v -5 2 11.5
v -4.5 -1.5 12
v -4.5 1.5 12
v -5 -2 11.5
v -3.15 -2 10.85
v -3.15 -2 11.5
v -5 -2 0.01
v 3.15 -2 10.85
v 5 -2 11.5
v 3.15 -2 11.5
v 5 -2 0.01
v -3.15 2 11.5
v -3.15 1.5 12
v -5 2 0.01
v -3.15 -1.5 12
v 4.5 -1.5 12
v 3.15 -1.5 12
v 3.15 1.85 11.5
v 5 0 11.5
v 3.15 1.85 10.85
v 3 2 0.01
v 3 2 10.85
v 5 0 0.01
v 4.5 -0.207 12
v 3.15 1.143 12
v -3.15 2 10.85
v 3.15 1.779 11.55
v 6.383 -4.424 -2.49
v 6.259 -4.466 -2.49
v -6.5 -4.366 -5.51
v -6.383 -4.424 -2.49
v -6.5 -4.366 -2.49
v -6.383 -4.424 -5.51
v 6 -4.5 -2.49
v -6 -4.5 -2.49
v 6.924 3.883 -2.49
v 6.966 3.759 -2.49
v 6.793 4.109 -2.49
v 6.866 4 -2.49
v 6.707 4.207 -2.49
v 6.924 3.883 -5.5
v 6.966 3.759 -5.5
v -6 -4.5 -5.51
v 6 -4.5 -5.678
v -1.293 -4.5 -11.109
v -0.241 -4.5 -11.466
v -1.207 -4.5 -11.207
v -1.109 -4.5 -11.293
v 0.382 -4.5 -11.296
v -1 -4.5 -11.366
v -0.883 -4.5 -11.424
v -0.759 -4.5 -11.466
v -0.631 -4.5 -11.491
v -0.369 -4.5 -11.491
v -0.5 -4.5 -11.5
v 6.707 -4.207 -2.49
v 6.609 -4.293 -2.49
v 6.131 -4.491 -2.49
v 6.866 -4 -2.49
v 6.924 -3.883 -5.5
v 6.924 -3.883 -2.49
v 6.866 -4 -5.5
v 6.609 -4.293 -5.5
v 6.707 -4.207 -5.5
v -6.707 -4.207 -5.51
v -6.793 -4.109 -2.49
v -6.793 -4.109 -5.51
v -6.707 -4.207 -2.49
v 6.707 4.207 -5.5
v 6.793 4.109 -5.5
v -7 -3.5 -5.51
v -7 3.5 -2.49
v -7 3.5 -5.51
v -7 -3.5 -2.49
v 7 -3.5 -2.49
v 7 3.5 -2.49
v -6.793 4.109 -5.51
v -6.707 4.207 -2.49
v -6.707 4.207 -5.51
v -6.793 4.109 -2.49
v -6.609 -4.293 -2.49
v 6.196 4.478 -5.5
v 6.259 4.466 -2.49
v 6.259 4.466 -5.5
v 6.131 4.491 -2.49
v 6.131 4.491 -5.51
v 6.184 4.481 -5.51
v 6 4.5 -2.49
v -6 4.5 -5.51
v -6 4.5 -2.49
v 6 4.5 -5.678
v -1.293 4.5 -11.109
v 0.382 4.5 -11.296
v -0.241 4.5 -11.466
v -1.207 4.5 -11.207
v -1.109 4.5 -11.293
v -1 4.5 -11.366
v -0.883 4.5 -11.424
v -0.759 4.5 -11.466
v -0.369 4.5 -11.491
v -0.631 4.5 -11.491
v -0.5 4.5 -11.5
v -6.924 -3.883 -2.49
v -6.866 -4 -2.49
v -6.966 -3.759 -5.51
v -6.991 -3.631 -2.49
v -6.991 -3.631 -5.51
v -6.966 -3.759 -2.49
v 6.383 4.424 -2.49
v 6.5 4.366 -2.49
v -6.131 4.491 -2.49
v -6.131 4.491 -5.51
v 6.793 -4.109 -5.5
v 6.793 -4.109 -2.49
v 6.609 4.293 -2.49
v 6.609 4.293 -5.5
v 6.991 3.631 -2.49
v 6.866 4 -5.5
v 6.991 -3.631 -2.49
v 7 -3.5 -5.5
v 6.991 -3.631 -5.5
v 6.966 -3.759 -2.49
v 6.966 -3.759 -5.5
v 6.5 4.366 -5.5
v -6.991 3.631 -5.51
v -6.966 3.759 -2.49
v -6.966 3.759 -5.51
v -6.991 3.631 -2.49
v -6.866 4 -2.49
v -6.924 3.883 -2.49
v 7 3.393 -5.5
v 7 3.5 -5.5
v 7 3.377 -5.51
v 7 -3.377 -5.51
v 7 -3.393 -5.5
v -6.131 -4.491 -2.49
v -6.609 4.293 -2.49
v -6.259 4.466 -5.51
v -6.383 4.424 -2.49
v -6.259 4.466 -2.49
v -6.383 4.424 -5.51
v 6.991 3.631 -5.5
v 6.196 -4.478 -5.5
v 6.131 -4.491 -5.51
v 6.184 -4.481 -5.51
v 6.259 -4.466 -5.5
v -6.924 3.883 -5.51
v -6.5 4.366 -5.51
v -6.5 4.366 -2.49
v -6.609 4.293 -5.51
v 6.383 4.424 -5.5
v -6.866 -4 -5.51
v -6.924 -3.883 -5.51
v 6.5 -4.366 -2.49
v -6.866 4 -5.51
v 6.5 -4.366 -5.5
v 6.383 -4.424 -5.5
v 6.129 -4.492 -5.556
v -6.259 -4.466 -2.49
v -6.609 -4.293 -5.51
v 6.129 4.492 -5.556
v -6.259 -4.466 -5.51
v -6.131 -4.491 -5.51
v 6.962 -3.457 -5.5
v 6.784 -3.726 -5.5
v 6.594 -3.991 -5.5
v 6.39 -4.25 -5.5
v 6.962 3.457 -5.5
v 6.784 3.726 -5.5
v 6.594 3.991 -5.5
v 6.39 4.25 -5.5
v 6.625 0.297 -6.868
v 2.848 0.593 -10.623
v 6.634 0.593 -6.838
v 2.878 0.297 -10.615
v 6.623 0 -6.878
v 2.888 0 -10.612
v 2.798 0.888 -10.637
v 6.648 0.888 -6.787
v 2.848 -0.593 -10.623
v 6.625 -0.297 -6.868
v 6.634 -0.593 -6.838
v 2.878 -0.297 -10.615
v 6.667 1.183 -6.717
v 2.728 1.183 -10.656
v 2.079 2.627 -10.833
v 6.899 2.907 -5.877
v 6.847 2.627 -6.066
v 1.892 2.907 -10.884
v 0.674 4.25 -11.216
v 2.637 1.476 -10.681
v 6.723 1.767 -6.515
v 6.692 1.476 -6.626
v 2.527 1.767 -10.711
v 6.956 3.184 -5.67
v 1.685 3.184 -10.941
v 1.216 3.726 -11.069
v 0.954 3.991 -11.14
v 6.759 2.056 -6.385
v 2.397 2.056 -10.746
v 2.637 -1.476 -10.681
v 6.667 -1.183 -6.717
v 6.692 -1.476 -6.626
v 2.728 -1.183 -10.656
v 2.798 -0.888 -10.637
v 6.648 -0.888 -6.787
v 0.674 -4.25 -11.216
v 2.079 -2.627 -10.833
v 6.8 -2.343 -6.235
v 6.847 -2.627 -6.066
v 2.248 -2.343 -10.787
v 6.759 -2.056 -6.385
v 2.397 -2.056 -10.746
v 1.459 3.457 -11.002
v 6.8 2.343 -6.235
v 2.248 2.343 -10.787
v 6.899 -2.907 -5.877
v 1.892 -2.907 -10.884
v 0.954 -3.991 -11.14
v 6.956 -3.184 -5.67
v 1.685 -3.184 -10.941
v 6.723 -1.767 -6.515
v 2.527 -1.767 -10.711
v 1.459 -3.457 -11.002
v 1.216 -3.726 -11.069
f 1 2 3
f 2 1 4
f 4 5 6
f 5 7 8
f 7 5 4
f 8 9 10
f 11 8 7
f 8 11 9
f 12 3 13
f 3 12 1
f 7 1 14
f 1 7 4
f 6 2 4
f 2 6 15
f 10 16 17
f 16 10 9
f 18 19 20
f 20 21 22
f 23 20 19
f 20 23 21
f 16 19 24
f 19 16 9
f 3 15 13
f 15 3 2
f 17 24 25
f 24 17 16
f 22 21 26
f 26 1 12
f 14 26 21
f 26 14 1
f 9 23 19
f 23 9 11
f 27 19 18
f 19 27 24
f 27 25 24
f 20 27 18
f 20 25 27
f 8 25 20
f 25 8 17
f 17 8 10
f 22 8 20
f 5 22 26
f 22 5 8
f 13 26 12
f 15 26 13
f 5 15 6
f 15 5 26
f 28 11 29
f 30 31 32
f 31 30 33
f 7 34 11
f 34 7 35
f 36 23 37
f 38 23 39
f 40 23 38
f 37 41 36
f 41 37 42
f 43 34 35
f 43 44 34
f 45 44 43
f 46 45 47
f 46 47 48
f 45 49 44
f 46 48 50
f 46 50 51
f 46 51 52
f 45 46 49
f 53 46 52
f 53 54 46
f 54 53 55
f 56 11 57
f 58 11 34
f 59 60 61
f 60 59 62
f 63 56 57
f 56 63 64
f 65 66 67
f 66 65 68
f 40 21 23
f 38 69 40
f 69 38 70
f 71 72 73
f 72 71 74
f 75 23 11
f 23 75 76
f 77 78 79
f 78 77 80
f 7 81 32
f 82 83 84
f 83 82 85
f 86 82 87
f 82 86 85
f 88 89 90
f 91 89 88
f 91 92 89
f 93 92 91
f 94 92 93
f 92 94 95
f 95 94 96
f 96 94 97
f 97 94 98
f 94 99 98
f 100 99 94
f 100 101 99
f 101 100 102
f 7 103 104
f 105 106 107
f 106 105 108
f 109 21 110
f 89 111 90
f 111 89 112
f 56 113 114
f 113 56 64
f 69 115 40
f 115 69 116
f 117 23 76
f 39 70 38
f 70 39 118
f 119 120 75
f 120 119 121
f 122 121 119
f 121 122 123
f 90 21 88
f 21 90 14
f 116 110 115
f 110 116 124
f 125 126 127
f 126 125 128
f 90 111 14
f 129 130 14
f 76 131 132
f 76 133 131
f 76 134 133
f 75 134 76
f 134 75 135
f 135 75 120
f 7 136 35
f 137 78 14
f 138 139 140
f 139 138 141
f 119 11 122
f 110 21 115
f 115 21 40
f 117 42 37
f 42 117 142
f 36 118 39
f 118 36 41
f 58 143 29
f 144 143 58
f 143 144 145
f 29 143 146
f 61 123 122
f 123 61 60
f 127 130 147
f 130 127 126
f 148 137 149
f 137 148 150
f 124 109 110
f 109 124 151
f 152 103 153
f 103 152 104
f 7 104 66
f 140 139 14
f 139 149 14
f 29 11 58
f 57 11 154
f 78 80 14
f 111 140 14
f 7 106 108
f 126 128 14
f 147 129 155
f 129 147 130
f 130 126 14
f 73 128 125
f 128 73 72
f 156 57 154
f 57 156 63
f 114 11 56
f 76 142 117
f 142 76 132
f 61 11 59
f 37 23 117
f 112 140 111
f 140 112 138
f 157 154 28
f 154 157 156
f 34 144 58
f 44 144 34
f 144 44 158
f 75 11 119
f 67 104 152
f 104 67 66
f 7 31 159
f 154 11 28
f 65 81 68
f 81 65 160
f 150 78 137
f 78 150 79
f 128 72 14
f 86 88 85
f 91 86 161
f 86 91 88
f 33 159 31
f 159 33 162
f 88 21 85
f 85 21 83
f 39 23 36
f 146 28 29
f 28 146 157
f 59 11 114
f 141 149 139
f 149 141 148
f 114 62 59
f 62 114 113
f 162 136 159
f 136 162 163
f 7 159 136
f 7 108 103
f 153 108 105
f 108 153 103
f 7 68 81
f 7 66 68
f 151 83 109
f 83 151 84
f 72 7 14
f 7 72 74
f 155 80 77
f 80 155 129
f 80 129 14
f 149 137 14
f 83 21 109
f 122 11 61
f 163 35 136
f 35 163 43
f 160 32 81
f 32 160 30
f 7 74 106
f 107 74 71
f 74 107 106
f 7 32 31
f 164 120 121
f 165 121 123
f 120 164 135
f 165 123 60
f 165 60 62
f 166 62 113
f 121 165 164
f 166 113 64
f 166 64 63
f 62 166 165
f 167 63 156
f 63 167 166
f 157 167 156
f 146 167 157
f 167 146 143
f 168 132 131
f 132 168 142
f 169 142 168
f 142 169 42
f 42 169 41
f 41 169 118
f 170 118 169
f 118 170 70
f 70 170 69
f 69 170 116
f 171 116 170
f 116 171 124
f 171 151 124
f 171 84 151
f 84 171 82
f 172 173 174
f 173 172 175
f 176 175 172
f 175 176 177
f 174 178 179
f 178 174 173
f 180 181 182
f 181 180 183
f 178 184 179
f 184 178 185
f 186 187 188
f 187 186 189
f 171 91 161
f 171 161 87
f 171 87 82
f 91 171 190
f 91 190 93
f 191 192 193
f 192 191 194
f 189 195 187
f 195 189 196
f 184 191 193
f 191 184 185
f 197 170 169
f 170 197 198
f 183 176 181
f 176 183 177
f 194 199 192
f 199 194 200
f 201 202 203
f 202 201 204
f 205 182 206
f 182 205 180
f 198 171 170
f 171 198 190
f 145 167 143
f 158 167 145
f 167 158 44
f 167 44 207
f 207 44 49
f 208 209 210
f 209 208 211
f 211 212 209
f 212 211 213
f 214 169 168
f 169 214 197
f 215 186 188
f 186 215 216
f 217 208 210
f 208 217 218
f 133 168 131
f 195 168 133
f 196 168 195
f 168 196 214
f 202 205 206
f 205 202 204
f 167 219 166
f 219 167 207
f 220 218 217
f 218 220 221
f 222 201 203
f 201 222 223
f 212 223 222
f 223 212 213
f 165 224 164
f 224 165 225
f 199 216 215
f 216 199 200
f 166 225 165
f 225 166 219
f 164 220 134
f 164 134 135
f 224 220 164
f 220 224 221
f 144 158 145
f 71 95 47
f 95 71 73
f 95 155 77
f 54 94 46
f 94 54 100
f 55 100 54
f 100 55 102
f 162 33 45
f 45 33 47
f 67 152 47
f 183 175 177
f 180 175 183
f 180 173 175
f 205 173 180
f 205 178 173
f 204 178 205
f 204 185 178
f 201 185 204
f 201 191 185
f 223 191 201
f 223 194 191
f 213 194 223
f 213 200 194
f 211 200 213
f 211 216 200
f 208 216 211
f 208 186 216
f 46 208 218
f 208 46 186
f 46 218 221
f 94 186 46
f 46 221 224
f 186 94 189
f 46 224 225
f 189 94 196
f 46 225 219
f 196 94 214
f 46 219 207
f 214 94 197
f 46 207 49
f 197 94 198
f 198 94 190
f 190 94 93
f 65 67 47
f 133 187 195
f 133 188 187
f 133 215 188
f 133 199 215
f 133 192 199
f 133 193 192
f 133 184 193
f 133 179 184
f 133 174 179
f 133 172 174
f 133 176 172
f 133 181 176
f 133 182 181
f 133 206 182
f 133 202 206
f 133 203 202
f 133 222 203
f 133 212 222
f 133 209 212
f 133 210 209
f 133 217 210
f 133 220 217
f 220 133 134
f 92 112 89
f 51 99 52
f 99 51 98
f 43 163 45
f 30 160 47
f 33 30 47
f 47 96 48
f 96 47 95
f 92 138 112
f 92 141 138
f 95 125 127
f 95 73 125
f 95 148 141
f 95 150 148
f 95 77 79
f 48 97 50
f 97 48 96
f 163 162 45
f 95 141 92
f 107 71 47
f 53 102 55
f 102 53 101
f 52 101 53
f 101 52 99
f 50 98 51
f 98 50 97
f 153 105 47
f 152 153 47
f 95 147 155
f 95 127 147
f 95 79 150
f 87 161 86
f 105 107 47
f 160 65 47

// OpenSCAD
// =====================================================================
//  tip_P_carrier.scad — SP1 tip P: carrier for a trimmed PRESS-ON NAIL
//  PROJECT SCRATCH · 05-engineering/cad/tips · units: mm
//  Zero-fabrication reference tip.  A press-on ABS nail (KISS 100 Full-Cover,
//  size 1-2, ~8-9 mm wide), trimmed to 10 mm long, is CA-bonded
//  with its concave underside on a CONVEX cylindrical bed (R 8.5, axis at 45 deg)
//  so its convex dorsal face faces +X and down = the leading face.
//  Bed length ≈ 7.5 mm; the nail's free edge overhangs ≈ 2.5-3 mm; fill the void
//  under the overhang with gel CA / 5-min epoxy (no hollow under the nail).
//  EDGE RADIUS (red line 11, DESIGN-FREEZE 1.8): a single ~0.6 mm nail can only
//  be filed to R <= 0.3 (half its thickness) = A45 class, GATED.  For first human
//  sessions nest two nails CA-bonded (~1.2 mm) or use one >= 0.8 mm thick, and
//  file the free edge to R 0.4-0.5; tape test (L9) before use.
//  Nail edge lowest point ≈ z = -14.3 to -14.7 (-15.0 with two nested nails).
//  Free overhang beyond the gel-CA fill: <= 3 mm (ABS proof load, redteam-2).
//  Loaded sense +X.  Print: PETG, tang down, 0.10 mm layers.
// =====================================================================
include <tm1_tang_lib.scad>
$fn = TM1_FN;

BED_R       = 8.5;      // convex bed radius (nail underside R ≈ 8.5-9)
BED_ATTACK  = 45;       // bed axis angle: rises toward +X at this angle
BED_AXIS_X  = -4.52;    // axis passes through (BED_AXIS_X, 0, BED_AXIS_Z); the bed surface meets
BED_AXIS_Z  = -6.0;     // the band's bottom front edge at |y| = 3.4 (band corner at y = 0 is 7.8 mm
                        // from the axis); at y = 0 the bed spans z = -6.9 .. -10.6
BOSS_FRONT  = [5.0, -9.0];   // hull point giving material out to the bed surface
BOSS_BOTTOM = [-0.5, -10.5]; // hull point: pulp lump behind/below the bed (r = 1 cylinders)
CROSS_HOLE  = false;

module tip_P_carrier(cross_hole = CROSS_HOLE) {
    tm1_tip_base(cross_hole);
    difference() {
        hull() {
            tm1_band_slab();
            tm1_ycyl(1.0, TM1_SH_Y, BOSS_FRONT[0], BOSS_FRONT[1]);
            tm1_ycyl(1.0, TM1_SH_Y, BOSS_BOTTOM[0], BOSS_BOTTOM[1]);
        }
        // carve the convex bed: remove everything farther than BED_R from the
        // inclined axis, but only below the shoulder band
        intersection() {
            translate([BED_AXIS_X, 0, BED_AXIS_Z]) rotate([0, 90 - BED_ATTACK, 0])
                difference() {
                    cylinder(r = 40, h = 60, center = true, $fn = TM1_FN);
                    cylinder(r = BED_R, h = 62, center = true, $fn = 180);
                }
            translate([0, 0, TM1_SH_BOT - 50]) cube([100, 100, 100], center = true);
        }
    }
}

tip_P_carrier();
